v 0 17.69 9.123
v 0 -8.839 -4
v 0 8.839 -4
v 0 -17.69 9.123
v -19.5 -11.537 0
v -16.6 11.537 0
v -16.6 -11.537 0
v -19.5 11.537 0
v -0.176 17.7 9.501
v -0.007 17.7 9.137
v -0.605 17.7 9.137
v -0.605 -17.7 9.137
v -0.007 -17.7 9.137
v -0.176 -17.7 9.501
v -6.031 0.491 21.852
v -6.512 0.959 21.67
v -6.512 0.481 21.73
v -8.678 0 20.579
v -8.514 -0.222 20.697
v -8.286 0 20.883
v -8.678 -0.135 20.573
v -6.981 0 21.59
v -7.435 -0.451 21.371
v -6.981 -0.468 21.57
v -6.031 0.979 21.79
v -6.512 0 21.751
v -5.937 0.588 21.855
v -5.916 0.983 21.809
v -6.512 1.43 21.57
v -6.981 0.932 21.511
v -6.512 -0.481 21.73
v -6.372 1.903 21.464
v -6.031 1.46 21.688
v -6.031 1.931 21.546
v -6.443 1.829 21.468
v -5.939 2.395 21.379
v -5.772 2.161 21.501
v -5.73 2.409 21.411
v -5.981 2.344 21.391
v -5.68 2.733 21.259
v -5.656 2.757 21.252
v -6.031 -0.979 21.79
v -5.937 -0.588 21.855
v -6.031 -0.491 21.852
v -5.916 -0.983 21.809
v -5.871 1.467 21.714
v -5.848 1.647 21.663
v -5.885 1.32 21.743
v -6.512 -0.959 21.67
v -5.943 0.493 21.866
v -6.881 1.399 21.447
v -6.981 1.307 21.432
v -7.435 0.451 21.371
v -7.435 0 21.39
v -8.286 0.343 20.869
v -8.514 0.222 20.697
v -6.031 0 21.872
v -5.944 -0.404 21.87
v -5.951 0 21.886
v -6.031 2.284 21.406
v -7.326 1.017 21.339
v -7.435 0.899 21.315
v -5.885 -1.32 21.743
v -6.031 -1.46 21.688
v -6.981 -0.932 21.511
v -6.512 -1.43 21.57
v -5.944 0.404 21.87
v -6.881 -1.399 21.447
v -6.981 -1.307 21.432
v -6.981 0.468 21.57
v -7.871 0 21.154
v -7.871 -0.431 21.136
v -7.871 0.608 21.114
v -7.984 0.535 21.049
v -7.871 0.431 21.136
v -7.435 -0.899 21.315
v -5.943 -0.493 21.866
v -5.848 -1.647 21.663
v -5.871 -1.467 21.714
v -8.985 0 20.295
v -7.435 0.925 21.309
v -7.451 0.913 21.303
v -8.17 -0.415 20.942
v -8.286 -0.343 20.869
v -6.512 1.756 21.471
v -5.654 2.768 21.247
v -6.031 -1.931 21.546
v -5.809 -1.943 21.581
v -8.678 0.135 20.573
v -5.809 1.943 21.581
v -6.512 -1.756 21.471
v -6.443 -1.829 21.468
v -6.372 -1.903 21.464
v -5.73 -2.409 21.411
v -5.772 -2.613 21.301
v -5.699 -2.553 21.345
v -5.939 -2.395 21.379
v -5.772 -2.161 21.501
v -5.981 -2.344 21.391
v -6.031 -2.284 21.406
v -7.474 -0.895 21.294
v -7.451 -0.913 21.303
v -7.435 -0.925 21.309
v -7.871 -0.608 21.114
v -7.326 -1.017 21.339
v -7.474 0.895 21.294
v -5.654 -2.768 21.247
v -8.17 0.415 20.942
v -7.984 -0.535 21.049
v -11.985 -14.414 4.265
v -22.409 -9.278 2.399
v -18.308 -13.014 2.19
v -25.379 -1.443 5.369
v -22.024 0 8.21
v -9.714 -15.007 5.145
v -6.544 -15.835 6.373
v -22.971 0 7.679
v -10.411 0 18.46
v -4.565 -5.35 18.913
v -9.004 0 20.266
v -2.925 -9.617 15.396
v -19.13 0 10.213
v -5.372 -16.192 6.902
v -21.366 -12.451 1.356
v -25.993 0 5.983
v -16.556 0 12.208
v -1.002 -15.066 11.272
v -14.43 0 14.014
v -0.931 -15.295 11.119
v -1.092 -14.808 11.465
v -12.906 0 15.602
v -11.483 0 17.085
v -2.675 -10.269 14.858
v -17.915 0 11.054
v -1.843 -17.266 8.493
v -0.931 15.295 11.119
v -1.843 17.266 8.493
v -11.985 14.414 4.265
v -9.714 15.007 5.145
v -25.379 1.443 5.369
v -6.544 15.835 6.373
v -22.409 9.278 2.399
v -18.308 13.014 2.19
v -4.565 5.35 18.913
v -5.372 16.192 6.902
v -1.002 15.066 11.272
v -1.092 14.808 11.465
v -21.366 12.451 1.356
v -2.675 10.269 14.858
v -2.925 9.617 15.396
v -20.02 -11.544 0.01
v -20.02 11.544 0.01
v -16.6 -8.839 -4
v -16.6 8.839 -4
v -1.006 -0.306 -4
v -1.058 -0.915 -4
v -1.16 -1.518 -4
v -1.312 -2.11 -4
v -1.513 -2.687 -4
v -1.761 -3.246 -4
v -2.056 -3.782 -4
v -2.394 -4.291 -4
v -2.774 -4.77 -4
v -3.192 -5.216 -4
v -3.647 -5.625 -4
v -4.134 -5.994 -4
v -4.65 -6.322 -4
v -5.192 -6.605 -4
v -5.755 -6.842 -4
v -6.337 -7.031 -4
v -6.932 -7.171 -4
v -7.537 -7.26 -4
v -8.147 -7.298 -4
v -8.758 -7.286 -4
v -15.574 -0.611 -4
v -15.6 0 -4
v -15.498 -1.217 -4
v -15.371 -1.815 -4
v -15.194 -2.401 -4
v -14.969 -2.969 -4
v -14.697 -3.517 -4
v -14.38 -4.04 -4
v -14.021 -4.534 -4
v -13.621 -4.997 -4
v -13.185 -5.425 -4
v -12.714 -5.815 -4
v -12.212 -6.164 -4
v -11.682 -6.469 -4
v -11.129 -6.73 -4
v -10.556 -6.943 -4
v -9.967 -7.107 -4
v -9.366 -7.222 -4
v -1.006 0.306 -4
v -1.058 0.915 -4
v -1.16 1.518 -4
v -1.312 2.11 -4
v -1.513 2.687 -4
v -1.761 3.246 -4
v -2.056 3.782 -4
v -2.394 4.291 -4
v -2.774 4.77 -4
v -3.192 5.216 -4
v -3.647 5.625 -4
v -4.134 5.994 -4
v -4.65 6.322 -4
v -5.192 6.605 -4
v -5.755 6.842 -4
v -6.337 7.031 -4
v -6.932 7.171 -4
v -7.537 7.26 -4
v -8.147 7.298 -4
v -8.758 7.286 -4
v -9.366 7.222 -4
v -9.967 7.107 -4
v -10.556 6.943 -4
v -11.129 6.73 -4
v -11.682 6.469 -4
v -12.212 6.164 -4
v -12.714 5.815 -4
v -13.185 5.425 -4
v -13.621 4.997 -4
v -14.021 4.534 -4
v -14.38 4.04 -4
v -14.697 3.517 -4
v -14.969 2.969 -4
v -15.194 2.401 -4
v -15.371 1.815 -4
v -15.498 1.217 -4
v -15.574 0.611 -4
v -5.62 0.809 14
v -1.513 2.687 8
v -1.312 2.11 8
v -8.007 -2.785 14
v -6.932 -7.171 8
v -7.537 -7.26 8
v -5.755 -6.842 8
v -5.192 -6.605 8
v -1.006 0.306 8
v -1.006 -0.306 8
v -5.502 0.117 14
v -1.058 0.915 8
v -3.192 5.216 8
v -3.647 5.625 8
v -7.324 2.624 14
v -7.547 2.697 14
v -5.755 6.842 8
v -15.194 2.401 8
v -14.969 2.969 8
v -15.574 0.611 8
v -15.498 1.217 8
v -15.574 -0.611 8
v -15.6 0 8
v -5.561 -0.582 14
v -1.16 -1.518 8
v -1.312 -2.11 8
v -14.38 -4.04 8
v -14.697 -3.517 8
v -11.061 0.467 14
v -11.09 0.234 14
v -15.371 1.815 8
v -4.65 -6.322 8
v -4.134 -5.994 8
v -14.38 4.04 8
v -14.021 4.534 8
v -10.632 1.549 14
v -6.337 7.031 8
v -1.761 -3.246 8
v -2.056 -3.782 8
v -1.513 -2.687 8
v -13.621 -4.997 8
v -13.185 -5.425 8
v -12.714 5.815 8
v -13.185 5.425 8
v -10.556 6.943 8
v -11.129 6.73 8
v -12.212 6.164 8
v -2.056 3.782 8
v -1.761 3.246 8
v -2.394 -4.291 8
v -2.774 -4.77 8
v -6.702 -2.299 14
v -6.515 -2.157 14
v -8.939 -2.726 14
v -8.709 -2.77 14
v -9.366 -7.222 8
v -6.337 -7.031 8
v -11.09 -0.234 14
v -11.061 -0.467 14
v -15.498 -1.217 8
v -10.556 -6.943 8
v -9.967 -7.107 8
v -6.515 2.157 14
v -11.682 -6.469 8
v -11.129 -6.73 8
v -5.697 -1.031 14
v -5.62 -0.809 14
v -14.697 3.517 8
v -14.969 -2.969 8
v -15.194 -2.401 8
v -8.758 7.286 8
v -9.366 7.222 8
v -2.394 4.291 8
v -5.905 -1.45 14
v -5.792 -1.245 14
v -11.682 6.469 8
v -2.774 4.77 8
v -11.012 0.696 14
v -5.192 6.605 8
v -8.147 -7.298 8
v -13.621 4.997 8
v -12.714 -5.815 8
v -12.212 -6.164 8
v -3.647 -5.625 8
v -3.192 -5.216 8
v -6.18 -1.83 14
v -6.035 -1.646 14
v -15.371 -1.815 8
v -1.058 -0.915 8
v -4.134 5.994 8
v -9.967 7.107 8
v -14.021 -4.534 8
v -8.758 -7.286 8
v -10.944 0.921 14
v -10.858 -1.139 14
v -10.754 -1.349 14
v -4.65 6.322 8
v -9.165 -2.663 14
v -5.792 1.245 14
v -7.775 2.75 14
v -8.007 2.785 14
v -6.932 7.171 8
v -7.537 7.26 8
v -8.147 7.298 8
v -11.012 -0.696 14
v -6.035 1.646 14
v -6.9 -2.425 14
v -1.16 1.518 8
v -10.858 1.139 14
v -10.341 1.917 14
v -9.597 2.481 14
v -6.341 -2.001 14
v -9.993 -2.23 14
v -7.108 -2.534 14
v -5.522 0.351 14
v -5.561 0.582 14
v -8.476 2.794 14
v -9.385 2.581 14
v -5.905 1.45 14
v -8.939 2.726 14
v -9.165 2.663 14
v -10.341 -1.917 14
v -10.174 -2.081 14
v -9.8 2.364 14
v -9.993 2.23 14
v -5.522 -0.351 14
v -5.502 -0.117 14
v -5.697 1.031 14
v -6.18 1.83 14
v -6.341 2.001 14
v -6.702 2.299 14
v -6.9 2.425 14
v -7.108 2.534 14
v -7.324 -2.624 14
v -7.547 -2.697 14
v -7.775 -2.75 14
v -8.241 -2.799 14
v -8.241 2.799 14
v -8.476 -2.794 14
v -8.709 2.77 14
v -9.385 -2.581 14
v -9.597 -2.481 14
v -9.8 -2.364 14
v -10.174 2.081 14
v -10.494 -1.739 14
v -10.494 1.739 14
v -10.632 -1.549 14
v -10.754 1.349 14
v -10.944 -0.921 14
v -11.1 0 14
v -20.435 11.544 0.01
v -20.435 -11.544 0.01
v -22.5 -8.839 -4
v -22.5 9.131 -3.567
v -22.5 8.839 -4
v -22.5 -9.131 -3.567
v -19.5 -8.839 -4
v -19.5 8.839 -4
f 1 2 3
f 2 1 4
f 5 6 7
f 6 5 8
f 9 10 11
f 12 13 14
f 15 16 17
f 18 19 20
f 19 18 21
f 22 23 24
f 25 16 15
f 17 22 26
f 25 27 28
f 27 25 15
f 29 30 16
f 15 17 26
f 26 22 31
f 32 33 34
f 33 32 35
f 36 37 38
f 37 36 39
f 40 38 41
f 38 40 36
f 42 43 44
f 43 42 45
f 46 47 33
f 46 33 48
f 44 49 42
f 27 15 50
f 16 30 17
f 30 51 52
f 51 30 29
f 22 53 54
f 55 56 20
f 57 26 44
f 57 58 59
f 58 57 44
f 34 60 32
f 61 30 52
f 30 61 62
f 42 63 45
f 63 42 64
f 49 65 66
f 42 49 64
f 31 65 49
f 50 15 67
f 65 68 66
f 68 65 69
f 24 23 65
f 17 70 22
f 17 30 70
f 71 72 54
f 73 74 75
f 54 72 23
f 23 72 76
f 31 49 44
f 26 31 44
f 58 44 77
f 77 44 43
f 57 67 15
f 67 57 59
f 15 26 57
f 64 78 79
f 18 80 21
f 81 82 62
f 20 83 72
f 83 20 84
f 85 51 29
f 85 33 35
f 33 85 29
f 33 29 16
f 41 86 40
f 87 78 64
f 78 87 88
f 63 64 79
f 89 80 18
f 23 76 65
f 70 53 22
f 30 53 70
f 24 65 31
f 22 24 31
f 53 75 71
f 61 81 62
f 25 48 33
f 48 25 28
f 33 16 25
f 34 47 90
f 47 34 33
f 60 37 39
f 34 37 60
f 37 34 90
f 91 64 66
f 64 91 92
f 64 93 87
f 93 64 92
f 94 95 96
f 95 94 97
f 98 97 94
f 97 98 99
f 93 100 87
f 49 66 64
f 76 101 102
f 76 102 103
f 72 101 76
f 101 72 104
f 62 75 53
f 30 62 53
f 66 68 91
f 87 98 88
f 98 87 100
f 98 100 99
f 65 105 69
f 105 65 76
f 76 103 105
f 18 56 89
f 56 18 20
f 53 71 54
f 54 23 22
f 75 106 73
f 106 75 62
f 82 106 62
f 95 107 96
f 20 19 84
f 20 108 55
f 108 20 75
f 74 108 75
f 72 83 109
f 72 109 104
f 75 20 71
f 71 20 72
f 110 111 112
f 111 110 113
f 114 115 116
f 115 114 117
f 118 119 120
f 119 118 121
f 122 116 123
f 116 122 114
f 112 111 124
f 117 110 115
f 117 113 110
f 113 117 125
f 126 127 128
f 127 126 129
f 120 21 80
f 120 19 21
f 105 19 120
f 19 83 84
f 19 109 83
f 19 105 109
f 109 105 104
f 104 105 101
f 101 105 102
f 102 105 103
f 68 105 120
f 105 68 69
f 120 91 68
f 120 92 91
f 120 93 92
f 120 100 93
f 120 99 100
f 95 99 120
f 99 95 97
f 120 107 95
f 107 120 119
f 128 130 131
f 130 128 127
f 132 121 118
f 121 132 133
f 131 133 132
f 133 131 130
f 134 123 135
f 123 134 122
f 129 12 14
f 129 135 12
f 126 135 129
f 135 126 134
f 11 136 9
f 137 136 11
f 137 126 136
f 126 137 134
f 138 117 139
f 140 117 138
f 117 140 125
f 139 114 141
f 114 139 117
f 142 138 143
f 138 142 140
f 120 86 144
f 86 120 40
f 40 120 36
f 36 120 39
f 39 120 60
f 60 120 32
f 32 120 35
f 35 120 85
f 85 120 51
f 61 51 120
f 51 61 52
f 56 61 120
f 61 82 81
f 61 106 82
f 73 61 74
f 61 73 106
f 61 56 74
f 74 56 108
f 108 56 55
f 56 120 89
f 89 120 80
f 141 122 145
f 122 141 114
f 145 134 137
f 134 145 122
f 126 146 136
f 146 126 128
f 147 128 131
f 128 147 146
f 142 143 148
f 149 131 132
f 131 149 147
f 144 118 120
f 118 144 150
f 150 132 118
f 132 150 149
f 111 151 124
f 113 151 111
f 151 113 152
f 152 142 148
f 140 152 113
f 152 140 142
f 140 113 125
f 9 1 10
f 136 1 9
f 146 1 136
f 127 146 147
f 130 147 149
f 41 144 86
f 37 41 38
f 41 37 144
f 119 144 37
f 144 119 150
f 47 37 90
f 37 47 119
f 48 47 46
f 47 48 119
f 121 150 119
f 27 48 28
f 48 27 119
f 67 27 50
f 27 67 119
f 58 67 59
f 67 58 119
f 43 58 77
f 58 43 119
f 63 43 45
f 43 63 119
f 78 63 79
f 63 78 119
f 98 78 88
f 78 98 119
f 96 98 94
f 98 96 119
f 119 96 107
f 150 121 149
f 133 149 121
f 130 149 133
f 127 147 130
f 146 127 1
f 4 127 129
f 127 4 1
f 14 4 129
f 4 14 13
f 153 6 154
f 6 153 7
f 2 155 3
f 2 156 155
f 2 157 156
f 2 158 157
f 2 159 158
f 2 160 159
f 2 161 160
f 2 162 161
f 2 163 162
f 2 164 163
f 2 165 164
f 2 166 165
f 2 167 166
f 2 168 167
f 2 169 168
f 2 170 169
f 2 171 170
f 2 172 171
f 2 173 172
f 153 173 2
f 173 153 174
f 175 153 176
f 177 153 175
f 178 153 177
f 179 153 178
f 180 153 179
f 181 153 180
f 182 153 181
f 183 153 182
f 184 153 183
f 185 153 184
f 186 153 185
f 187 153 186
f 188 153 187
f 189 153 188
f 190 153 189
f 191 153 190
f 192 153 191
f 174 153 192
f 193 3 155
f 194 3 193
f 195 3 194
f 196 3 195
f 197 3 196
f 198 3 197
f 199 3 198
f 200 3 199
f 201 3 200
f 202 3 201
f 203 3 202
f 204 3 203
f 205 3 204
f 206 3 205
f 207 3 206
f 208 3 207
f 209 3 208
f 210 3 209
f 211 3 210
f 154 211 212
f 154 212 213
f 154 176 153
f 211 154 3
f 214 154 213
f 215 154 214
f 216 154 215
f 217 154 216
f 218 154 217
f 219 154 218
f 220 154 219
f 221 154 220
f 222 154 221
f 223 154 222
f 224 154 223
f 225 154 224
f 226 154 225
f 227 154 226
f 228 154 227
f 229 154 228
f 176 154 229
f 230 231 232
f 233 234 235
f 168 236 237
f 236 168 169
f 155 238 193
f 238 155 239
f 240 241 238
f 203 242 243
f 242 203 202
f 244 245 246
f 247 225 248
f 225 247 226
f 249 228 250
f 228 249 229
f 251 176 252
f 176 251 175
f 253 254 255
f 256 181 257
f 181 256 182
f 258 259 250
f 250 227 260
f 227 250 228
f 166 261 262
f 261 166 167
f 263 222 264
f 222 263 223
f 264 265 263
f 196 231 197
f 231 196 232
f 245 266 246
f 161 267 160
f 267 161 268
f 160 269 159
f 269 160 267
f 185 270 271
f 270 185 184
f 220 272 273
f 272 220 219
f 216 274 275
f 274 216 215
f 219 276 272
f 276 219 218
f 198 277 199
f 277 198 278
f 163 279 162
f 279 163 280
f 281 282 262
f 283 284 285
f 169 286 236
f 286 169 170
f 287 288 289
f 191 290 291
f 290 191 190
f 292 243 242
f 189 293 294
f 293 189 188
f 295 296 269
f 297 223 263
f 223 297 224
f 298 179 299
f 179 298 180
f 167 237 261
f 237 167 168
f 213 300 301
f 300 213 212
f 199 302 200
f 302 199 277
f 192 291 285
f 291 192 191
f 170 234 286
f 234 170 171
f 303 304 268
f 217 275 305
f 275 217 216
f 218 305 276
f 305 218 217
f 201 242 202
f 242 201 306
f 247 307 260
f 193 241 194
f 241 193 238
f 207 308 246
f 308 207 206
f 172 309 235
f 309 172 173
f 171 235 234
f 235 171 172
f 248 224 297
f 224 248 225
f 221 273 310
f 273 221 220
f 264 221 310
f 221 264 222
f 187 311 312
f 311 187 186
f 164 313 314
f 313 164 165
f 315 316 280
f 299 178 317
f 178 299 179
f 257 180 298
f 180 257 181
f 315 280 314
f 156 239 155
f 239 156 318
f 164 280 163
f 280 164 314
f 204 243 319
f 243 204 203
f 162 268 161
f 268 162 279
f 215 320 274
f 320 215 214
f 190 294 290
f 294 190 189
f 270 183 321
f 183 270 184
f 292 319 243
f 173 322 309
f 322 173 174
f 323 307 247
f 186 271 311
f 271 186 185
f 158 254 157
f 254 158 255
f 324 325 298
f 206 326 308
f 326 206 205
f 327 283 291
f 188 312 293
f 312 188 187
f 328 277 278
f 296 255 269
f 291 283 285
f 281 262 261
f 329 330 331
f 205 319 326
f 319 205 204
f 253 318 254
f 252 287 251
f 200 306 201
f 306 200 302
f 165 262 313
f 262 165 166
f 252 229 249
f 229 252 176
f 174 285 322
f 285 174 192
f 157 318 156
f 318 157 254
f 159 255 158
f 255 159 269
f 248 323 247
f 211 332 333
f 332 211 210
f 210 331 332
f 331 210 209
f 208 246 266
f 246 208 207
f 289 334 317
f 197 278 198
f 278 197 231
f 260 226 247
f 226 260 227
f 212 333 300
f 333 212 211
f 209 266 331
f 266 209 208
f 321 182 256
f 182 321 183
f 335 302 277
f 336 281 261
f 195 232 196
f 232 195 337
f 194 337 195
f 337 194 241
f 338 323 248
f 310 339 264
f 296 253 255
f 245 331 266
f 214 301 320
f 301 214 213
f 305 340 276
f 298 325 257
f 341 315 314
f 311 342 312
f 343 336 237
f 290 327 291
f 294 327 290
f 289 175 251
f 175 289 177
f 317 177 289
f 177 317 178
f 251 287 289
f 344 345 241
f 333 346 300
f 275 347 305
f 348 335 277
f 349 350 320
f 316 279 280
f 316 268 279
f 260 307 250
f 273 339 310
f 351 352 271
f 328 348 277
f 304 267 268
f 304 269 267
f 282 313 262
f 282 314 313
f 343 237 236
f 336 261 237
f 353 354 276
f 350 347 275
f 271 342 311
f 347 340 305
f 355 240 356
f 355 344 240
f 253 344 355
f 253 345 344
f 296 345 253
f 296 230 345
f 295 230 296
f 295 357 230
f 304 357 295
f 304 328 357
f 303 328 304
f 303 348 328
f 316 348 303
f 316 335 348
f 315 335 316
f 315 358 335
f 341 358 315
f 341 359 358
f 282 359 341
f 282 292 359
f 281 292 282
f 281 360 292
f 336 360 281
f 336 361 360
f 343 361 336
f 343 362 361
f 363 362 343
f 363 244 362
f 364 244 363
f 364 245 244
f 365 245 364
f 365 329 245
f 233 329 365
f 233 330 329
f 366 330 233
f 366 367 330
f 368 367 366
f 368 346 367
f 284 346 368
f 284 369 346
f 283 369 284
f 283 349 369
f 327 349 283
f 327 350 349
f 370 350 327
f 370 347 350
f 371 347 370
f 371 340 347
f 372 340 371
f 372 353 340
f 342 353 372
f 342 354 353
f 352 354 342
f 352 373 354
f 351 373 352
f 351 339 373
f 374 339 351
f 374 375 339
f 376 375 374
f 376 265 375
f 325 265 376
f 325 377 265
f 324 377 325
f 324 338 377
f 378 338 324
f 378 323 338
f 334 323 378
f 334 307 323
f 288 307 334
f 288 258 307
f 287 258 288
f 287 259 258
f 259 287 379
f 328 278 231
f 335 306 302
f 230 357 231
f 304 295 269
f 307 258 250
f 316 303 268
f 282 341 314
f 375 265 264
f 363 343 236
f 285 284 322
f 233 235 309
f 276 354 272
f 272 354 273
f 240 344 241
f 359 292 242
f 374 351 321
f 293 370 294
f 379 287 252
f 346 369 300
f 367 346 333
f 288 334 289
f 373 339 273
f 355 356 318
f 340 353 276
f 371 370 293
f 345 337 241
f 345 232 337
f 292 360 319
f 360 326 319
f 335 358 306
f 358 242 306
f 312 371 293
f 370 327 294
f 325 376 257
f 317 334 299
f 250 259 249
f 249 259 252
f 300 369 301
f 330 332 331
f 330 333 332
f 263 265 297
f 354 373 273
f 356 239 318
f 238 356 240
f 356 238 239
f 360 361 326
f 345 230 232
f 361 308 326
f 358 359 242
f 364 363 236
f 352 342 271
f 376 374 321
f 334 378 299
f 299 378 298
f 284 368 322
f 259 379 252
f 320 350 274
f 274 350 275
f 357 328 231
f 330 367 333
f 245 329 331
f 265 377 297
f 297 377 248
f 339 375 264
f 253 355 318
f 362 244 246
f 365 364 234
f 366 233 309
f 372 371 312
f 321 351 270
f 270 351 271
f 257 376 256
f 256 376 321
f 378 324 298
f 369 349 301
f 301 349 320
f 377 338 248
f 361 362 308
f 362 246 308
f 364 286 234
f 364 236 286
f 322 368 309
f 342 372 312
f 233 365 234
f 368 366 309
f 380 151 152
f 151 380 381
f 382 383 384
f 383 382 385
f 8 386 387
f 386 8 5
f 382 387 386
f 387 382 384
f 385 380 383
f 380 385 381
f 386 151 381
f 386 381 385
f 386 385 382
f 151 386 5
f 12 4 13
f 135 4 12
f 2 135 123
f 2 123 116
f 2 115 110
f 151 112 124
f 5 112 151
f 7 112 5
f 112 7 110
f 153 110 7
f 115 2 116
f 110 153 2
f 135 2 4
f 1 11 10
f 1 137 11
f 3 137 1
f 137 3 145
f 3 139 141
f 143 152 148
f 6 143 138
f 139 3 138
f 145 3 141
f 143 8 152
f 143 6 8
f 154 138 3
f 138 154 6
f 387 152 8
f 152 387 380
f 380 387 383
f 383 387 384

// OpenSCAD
/*
 * http://www.thingiverse.com/thing:87677
 *
 * Snow plow attachment designed for Brio/Thomas style wooden trains.
 *
 * This vertical-print version is designed to look more like the plow on the
 * "Adventures of Thomas" train than the original pattern (thing:54071).  It
 * also has a tilted-up bottom edge of the blade to hopefully prevent it from
 * getting stuck when the toy train goes down a slope.
 *
 * The vertical printing alignment is designed to allow for the tilted bottom
 * edge, but also means that I was unable to print the tabs designed for the
 * original pattern to hold this onto the train.  Thus, you will have to use
 * the mounting-magnet cavity in order to use this accessory effectively with
 * your child's trains.  Just insert the magnet (after double-checking polarity)
 * and glue it into place with epoxy or by manually extruding plastic into the
 * hole.
 *
 * Mounting-magnet dimensions are based on:
 *
 *   http://www.cherrytreetoys.com/Ceramic-Magnet-P3616.aspx
 *
 * Copyright 2013 to Chris Petersen
 * License: http://creativecommons.org/licenses/by-sa/3.0/
 *
 * Find the latest versions of this and other related designs at:
 *
 *   https://github.com/ex-nerd/3d
 */

/* [Global] */

// Render support structure?
support = true;

/* [Hidden] */

/*
 * Render the snow plow
 */
module plow($fn=75) {
    // Basic configuration
    w = 25.4; // Width of plow
    h = 22; // Height of plow
    d = 20;   // Depth (distance to tip) of plow (plus a little extra for the bullnose effect)
    // The height of the mounting block that extends behind the plow
    mount_height=h-5.4;
    // Radius of the hole to cut for the train's magnet to be insert into (adjusted for shrinkage)
    mount_radius = (mount_height/2)-1;
    magnet_radius = 6.8;

    /*
     * Creates one side of the curve of the plow blade.
     * Intended to be mirrored.
     */
    module half_cutout() {
      hull() {
        translate([70,34,h+10])
          scale(v=[1,1,.05])
              sphere(r=75);
        translate([46,52,0])
          scale(v=[1,1,.05])
            sphere(r=50);
      }
    }

    /*
     * Creates both sides of the curve of the plow blade.
     * Intended to be used with difference().
     */
    module cutout() {
      union() {
        mirror([0,1,0])
          half_cutout();
        half_cutout();
      }
    }

    /*
     * The plow blade
     */
    module blade() {
      difference() {
        translate([0,-w/2-5,0]) {
          union() {
            cube(size = [d,w+10,h+5]);
            // bullnose
            translate([d-4,w/2+5,4.8])
              sphere(6);
          }
        }
        cutout();
        // peak
        translate([-.01,-w/2-6,h-2]) rotate([0,-45,0])
            cube(size = [14,w+12,6]);
        // This tilts the tip of blade of the plow slightly upwards.
        translate([14,-w/2-6,-h])
          rotate(a=[0,-25,0])
            cube(size = [d*2,w+12,h]);
      }
    }

    /*
     * Plow blade and assembly to mount it to a wooden train.
     */
    rotate([0,-90,0]) {
        difference() {
            union() {
            difference() {
              union() {
                blade();
                 // magnet cavity holder
                translate([-4,-w/2,0])
                  cube(size = [5,w,mount_height]);
              }
              // Train-magnet cavity
              translate([4,0,mount_radius+(mount_height/2-mount_radius)])
                rotate([0,-90,0])
                  hull() {
                    translate([0,0,-4]) cylinder(r=mount_radius, h=14+1);
                    translate([0,0,-10])
                      cylinder(r=magnet_radius-4, h=14+1);
                  }
            }
            // Support blocks
            if (support) {
              translate([0,0,0]) difference() {
                union() {
                  // plow peak support
                  translate([-4,-w/2,h-2.5])
                    cube(size = [4.01,w,3]);
                }
                translate([-4,-w/2,h+.75]) rotate([0,30,0])
                  cube(size = [5,w+1,4]);
              }
            }
          }
          // edges
          translate([-6,-w/2+5.2+.01,-.1]) rotate([0,0,236])
            cube(size = [6,20,h+5]);
          translate([-6,w/2-5.2-.01,-.1]) rotate([0,0,34])
            cube(size = [20,6,h+5]);
        }
    }
}

plow();
